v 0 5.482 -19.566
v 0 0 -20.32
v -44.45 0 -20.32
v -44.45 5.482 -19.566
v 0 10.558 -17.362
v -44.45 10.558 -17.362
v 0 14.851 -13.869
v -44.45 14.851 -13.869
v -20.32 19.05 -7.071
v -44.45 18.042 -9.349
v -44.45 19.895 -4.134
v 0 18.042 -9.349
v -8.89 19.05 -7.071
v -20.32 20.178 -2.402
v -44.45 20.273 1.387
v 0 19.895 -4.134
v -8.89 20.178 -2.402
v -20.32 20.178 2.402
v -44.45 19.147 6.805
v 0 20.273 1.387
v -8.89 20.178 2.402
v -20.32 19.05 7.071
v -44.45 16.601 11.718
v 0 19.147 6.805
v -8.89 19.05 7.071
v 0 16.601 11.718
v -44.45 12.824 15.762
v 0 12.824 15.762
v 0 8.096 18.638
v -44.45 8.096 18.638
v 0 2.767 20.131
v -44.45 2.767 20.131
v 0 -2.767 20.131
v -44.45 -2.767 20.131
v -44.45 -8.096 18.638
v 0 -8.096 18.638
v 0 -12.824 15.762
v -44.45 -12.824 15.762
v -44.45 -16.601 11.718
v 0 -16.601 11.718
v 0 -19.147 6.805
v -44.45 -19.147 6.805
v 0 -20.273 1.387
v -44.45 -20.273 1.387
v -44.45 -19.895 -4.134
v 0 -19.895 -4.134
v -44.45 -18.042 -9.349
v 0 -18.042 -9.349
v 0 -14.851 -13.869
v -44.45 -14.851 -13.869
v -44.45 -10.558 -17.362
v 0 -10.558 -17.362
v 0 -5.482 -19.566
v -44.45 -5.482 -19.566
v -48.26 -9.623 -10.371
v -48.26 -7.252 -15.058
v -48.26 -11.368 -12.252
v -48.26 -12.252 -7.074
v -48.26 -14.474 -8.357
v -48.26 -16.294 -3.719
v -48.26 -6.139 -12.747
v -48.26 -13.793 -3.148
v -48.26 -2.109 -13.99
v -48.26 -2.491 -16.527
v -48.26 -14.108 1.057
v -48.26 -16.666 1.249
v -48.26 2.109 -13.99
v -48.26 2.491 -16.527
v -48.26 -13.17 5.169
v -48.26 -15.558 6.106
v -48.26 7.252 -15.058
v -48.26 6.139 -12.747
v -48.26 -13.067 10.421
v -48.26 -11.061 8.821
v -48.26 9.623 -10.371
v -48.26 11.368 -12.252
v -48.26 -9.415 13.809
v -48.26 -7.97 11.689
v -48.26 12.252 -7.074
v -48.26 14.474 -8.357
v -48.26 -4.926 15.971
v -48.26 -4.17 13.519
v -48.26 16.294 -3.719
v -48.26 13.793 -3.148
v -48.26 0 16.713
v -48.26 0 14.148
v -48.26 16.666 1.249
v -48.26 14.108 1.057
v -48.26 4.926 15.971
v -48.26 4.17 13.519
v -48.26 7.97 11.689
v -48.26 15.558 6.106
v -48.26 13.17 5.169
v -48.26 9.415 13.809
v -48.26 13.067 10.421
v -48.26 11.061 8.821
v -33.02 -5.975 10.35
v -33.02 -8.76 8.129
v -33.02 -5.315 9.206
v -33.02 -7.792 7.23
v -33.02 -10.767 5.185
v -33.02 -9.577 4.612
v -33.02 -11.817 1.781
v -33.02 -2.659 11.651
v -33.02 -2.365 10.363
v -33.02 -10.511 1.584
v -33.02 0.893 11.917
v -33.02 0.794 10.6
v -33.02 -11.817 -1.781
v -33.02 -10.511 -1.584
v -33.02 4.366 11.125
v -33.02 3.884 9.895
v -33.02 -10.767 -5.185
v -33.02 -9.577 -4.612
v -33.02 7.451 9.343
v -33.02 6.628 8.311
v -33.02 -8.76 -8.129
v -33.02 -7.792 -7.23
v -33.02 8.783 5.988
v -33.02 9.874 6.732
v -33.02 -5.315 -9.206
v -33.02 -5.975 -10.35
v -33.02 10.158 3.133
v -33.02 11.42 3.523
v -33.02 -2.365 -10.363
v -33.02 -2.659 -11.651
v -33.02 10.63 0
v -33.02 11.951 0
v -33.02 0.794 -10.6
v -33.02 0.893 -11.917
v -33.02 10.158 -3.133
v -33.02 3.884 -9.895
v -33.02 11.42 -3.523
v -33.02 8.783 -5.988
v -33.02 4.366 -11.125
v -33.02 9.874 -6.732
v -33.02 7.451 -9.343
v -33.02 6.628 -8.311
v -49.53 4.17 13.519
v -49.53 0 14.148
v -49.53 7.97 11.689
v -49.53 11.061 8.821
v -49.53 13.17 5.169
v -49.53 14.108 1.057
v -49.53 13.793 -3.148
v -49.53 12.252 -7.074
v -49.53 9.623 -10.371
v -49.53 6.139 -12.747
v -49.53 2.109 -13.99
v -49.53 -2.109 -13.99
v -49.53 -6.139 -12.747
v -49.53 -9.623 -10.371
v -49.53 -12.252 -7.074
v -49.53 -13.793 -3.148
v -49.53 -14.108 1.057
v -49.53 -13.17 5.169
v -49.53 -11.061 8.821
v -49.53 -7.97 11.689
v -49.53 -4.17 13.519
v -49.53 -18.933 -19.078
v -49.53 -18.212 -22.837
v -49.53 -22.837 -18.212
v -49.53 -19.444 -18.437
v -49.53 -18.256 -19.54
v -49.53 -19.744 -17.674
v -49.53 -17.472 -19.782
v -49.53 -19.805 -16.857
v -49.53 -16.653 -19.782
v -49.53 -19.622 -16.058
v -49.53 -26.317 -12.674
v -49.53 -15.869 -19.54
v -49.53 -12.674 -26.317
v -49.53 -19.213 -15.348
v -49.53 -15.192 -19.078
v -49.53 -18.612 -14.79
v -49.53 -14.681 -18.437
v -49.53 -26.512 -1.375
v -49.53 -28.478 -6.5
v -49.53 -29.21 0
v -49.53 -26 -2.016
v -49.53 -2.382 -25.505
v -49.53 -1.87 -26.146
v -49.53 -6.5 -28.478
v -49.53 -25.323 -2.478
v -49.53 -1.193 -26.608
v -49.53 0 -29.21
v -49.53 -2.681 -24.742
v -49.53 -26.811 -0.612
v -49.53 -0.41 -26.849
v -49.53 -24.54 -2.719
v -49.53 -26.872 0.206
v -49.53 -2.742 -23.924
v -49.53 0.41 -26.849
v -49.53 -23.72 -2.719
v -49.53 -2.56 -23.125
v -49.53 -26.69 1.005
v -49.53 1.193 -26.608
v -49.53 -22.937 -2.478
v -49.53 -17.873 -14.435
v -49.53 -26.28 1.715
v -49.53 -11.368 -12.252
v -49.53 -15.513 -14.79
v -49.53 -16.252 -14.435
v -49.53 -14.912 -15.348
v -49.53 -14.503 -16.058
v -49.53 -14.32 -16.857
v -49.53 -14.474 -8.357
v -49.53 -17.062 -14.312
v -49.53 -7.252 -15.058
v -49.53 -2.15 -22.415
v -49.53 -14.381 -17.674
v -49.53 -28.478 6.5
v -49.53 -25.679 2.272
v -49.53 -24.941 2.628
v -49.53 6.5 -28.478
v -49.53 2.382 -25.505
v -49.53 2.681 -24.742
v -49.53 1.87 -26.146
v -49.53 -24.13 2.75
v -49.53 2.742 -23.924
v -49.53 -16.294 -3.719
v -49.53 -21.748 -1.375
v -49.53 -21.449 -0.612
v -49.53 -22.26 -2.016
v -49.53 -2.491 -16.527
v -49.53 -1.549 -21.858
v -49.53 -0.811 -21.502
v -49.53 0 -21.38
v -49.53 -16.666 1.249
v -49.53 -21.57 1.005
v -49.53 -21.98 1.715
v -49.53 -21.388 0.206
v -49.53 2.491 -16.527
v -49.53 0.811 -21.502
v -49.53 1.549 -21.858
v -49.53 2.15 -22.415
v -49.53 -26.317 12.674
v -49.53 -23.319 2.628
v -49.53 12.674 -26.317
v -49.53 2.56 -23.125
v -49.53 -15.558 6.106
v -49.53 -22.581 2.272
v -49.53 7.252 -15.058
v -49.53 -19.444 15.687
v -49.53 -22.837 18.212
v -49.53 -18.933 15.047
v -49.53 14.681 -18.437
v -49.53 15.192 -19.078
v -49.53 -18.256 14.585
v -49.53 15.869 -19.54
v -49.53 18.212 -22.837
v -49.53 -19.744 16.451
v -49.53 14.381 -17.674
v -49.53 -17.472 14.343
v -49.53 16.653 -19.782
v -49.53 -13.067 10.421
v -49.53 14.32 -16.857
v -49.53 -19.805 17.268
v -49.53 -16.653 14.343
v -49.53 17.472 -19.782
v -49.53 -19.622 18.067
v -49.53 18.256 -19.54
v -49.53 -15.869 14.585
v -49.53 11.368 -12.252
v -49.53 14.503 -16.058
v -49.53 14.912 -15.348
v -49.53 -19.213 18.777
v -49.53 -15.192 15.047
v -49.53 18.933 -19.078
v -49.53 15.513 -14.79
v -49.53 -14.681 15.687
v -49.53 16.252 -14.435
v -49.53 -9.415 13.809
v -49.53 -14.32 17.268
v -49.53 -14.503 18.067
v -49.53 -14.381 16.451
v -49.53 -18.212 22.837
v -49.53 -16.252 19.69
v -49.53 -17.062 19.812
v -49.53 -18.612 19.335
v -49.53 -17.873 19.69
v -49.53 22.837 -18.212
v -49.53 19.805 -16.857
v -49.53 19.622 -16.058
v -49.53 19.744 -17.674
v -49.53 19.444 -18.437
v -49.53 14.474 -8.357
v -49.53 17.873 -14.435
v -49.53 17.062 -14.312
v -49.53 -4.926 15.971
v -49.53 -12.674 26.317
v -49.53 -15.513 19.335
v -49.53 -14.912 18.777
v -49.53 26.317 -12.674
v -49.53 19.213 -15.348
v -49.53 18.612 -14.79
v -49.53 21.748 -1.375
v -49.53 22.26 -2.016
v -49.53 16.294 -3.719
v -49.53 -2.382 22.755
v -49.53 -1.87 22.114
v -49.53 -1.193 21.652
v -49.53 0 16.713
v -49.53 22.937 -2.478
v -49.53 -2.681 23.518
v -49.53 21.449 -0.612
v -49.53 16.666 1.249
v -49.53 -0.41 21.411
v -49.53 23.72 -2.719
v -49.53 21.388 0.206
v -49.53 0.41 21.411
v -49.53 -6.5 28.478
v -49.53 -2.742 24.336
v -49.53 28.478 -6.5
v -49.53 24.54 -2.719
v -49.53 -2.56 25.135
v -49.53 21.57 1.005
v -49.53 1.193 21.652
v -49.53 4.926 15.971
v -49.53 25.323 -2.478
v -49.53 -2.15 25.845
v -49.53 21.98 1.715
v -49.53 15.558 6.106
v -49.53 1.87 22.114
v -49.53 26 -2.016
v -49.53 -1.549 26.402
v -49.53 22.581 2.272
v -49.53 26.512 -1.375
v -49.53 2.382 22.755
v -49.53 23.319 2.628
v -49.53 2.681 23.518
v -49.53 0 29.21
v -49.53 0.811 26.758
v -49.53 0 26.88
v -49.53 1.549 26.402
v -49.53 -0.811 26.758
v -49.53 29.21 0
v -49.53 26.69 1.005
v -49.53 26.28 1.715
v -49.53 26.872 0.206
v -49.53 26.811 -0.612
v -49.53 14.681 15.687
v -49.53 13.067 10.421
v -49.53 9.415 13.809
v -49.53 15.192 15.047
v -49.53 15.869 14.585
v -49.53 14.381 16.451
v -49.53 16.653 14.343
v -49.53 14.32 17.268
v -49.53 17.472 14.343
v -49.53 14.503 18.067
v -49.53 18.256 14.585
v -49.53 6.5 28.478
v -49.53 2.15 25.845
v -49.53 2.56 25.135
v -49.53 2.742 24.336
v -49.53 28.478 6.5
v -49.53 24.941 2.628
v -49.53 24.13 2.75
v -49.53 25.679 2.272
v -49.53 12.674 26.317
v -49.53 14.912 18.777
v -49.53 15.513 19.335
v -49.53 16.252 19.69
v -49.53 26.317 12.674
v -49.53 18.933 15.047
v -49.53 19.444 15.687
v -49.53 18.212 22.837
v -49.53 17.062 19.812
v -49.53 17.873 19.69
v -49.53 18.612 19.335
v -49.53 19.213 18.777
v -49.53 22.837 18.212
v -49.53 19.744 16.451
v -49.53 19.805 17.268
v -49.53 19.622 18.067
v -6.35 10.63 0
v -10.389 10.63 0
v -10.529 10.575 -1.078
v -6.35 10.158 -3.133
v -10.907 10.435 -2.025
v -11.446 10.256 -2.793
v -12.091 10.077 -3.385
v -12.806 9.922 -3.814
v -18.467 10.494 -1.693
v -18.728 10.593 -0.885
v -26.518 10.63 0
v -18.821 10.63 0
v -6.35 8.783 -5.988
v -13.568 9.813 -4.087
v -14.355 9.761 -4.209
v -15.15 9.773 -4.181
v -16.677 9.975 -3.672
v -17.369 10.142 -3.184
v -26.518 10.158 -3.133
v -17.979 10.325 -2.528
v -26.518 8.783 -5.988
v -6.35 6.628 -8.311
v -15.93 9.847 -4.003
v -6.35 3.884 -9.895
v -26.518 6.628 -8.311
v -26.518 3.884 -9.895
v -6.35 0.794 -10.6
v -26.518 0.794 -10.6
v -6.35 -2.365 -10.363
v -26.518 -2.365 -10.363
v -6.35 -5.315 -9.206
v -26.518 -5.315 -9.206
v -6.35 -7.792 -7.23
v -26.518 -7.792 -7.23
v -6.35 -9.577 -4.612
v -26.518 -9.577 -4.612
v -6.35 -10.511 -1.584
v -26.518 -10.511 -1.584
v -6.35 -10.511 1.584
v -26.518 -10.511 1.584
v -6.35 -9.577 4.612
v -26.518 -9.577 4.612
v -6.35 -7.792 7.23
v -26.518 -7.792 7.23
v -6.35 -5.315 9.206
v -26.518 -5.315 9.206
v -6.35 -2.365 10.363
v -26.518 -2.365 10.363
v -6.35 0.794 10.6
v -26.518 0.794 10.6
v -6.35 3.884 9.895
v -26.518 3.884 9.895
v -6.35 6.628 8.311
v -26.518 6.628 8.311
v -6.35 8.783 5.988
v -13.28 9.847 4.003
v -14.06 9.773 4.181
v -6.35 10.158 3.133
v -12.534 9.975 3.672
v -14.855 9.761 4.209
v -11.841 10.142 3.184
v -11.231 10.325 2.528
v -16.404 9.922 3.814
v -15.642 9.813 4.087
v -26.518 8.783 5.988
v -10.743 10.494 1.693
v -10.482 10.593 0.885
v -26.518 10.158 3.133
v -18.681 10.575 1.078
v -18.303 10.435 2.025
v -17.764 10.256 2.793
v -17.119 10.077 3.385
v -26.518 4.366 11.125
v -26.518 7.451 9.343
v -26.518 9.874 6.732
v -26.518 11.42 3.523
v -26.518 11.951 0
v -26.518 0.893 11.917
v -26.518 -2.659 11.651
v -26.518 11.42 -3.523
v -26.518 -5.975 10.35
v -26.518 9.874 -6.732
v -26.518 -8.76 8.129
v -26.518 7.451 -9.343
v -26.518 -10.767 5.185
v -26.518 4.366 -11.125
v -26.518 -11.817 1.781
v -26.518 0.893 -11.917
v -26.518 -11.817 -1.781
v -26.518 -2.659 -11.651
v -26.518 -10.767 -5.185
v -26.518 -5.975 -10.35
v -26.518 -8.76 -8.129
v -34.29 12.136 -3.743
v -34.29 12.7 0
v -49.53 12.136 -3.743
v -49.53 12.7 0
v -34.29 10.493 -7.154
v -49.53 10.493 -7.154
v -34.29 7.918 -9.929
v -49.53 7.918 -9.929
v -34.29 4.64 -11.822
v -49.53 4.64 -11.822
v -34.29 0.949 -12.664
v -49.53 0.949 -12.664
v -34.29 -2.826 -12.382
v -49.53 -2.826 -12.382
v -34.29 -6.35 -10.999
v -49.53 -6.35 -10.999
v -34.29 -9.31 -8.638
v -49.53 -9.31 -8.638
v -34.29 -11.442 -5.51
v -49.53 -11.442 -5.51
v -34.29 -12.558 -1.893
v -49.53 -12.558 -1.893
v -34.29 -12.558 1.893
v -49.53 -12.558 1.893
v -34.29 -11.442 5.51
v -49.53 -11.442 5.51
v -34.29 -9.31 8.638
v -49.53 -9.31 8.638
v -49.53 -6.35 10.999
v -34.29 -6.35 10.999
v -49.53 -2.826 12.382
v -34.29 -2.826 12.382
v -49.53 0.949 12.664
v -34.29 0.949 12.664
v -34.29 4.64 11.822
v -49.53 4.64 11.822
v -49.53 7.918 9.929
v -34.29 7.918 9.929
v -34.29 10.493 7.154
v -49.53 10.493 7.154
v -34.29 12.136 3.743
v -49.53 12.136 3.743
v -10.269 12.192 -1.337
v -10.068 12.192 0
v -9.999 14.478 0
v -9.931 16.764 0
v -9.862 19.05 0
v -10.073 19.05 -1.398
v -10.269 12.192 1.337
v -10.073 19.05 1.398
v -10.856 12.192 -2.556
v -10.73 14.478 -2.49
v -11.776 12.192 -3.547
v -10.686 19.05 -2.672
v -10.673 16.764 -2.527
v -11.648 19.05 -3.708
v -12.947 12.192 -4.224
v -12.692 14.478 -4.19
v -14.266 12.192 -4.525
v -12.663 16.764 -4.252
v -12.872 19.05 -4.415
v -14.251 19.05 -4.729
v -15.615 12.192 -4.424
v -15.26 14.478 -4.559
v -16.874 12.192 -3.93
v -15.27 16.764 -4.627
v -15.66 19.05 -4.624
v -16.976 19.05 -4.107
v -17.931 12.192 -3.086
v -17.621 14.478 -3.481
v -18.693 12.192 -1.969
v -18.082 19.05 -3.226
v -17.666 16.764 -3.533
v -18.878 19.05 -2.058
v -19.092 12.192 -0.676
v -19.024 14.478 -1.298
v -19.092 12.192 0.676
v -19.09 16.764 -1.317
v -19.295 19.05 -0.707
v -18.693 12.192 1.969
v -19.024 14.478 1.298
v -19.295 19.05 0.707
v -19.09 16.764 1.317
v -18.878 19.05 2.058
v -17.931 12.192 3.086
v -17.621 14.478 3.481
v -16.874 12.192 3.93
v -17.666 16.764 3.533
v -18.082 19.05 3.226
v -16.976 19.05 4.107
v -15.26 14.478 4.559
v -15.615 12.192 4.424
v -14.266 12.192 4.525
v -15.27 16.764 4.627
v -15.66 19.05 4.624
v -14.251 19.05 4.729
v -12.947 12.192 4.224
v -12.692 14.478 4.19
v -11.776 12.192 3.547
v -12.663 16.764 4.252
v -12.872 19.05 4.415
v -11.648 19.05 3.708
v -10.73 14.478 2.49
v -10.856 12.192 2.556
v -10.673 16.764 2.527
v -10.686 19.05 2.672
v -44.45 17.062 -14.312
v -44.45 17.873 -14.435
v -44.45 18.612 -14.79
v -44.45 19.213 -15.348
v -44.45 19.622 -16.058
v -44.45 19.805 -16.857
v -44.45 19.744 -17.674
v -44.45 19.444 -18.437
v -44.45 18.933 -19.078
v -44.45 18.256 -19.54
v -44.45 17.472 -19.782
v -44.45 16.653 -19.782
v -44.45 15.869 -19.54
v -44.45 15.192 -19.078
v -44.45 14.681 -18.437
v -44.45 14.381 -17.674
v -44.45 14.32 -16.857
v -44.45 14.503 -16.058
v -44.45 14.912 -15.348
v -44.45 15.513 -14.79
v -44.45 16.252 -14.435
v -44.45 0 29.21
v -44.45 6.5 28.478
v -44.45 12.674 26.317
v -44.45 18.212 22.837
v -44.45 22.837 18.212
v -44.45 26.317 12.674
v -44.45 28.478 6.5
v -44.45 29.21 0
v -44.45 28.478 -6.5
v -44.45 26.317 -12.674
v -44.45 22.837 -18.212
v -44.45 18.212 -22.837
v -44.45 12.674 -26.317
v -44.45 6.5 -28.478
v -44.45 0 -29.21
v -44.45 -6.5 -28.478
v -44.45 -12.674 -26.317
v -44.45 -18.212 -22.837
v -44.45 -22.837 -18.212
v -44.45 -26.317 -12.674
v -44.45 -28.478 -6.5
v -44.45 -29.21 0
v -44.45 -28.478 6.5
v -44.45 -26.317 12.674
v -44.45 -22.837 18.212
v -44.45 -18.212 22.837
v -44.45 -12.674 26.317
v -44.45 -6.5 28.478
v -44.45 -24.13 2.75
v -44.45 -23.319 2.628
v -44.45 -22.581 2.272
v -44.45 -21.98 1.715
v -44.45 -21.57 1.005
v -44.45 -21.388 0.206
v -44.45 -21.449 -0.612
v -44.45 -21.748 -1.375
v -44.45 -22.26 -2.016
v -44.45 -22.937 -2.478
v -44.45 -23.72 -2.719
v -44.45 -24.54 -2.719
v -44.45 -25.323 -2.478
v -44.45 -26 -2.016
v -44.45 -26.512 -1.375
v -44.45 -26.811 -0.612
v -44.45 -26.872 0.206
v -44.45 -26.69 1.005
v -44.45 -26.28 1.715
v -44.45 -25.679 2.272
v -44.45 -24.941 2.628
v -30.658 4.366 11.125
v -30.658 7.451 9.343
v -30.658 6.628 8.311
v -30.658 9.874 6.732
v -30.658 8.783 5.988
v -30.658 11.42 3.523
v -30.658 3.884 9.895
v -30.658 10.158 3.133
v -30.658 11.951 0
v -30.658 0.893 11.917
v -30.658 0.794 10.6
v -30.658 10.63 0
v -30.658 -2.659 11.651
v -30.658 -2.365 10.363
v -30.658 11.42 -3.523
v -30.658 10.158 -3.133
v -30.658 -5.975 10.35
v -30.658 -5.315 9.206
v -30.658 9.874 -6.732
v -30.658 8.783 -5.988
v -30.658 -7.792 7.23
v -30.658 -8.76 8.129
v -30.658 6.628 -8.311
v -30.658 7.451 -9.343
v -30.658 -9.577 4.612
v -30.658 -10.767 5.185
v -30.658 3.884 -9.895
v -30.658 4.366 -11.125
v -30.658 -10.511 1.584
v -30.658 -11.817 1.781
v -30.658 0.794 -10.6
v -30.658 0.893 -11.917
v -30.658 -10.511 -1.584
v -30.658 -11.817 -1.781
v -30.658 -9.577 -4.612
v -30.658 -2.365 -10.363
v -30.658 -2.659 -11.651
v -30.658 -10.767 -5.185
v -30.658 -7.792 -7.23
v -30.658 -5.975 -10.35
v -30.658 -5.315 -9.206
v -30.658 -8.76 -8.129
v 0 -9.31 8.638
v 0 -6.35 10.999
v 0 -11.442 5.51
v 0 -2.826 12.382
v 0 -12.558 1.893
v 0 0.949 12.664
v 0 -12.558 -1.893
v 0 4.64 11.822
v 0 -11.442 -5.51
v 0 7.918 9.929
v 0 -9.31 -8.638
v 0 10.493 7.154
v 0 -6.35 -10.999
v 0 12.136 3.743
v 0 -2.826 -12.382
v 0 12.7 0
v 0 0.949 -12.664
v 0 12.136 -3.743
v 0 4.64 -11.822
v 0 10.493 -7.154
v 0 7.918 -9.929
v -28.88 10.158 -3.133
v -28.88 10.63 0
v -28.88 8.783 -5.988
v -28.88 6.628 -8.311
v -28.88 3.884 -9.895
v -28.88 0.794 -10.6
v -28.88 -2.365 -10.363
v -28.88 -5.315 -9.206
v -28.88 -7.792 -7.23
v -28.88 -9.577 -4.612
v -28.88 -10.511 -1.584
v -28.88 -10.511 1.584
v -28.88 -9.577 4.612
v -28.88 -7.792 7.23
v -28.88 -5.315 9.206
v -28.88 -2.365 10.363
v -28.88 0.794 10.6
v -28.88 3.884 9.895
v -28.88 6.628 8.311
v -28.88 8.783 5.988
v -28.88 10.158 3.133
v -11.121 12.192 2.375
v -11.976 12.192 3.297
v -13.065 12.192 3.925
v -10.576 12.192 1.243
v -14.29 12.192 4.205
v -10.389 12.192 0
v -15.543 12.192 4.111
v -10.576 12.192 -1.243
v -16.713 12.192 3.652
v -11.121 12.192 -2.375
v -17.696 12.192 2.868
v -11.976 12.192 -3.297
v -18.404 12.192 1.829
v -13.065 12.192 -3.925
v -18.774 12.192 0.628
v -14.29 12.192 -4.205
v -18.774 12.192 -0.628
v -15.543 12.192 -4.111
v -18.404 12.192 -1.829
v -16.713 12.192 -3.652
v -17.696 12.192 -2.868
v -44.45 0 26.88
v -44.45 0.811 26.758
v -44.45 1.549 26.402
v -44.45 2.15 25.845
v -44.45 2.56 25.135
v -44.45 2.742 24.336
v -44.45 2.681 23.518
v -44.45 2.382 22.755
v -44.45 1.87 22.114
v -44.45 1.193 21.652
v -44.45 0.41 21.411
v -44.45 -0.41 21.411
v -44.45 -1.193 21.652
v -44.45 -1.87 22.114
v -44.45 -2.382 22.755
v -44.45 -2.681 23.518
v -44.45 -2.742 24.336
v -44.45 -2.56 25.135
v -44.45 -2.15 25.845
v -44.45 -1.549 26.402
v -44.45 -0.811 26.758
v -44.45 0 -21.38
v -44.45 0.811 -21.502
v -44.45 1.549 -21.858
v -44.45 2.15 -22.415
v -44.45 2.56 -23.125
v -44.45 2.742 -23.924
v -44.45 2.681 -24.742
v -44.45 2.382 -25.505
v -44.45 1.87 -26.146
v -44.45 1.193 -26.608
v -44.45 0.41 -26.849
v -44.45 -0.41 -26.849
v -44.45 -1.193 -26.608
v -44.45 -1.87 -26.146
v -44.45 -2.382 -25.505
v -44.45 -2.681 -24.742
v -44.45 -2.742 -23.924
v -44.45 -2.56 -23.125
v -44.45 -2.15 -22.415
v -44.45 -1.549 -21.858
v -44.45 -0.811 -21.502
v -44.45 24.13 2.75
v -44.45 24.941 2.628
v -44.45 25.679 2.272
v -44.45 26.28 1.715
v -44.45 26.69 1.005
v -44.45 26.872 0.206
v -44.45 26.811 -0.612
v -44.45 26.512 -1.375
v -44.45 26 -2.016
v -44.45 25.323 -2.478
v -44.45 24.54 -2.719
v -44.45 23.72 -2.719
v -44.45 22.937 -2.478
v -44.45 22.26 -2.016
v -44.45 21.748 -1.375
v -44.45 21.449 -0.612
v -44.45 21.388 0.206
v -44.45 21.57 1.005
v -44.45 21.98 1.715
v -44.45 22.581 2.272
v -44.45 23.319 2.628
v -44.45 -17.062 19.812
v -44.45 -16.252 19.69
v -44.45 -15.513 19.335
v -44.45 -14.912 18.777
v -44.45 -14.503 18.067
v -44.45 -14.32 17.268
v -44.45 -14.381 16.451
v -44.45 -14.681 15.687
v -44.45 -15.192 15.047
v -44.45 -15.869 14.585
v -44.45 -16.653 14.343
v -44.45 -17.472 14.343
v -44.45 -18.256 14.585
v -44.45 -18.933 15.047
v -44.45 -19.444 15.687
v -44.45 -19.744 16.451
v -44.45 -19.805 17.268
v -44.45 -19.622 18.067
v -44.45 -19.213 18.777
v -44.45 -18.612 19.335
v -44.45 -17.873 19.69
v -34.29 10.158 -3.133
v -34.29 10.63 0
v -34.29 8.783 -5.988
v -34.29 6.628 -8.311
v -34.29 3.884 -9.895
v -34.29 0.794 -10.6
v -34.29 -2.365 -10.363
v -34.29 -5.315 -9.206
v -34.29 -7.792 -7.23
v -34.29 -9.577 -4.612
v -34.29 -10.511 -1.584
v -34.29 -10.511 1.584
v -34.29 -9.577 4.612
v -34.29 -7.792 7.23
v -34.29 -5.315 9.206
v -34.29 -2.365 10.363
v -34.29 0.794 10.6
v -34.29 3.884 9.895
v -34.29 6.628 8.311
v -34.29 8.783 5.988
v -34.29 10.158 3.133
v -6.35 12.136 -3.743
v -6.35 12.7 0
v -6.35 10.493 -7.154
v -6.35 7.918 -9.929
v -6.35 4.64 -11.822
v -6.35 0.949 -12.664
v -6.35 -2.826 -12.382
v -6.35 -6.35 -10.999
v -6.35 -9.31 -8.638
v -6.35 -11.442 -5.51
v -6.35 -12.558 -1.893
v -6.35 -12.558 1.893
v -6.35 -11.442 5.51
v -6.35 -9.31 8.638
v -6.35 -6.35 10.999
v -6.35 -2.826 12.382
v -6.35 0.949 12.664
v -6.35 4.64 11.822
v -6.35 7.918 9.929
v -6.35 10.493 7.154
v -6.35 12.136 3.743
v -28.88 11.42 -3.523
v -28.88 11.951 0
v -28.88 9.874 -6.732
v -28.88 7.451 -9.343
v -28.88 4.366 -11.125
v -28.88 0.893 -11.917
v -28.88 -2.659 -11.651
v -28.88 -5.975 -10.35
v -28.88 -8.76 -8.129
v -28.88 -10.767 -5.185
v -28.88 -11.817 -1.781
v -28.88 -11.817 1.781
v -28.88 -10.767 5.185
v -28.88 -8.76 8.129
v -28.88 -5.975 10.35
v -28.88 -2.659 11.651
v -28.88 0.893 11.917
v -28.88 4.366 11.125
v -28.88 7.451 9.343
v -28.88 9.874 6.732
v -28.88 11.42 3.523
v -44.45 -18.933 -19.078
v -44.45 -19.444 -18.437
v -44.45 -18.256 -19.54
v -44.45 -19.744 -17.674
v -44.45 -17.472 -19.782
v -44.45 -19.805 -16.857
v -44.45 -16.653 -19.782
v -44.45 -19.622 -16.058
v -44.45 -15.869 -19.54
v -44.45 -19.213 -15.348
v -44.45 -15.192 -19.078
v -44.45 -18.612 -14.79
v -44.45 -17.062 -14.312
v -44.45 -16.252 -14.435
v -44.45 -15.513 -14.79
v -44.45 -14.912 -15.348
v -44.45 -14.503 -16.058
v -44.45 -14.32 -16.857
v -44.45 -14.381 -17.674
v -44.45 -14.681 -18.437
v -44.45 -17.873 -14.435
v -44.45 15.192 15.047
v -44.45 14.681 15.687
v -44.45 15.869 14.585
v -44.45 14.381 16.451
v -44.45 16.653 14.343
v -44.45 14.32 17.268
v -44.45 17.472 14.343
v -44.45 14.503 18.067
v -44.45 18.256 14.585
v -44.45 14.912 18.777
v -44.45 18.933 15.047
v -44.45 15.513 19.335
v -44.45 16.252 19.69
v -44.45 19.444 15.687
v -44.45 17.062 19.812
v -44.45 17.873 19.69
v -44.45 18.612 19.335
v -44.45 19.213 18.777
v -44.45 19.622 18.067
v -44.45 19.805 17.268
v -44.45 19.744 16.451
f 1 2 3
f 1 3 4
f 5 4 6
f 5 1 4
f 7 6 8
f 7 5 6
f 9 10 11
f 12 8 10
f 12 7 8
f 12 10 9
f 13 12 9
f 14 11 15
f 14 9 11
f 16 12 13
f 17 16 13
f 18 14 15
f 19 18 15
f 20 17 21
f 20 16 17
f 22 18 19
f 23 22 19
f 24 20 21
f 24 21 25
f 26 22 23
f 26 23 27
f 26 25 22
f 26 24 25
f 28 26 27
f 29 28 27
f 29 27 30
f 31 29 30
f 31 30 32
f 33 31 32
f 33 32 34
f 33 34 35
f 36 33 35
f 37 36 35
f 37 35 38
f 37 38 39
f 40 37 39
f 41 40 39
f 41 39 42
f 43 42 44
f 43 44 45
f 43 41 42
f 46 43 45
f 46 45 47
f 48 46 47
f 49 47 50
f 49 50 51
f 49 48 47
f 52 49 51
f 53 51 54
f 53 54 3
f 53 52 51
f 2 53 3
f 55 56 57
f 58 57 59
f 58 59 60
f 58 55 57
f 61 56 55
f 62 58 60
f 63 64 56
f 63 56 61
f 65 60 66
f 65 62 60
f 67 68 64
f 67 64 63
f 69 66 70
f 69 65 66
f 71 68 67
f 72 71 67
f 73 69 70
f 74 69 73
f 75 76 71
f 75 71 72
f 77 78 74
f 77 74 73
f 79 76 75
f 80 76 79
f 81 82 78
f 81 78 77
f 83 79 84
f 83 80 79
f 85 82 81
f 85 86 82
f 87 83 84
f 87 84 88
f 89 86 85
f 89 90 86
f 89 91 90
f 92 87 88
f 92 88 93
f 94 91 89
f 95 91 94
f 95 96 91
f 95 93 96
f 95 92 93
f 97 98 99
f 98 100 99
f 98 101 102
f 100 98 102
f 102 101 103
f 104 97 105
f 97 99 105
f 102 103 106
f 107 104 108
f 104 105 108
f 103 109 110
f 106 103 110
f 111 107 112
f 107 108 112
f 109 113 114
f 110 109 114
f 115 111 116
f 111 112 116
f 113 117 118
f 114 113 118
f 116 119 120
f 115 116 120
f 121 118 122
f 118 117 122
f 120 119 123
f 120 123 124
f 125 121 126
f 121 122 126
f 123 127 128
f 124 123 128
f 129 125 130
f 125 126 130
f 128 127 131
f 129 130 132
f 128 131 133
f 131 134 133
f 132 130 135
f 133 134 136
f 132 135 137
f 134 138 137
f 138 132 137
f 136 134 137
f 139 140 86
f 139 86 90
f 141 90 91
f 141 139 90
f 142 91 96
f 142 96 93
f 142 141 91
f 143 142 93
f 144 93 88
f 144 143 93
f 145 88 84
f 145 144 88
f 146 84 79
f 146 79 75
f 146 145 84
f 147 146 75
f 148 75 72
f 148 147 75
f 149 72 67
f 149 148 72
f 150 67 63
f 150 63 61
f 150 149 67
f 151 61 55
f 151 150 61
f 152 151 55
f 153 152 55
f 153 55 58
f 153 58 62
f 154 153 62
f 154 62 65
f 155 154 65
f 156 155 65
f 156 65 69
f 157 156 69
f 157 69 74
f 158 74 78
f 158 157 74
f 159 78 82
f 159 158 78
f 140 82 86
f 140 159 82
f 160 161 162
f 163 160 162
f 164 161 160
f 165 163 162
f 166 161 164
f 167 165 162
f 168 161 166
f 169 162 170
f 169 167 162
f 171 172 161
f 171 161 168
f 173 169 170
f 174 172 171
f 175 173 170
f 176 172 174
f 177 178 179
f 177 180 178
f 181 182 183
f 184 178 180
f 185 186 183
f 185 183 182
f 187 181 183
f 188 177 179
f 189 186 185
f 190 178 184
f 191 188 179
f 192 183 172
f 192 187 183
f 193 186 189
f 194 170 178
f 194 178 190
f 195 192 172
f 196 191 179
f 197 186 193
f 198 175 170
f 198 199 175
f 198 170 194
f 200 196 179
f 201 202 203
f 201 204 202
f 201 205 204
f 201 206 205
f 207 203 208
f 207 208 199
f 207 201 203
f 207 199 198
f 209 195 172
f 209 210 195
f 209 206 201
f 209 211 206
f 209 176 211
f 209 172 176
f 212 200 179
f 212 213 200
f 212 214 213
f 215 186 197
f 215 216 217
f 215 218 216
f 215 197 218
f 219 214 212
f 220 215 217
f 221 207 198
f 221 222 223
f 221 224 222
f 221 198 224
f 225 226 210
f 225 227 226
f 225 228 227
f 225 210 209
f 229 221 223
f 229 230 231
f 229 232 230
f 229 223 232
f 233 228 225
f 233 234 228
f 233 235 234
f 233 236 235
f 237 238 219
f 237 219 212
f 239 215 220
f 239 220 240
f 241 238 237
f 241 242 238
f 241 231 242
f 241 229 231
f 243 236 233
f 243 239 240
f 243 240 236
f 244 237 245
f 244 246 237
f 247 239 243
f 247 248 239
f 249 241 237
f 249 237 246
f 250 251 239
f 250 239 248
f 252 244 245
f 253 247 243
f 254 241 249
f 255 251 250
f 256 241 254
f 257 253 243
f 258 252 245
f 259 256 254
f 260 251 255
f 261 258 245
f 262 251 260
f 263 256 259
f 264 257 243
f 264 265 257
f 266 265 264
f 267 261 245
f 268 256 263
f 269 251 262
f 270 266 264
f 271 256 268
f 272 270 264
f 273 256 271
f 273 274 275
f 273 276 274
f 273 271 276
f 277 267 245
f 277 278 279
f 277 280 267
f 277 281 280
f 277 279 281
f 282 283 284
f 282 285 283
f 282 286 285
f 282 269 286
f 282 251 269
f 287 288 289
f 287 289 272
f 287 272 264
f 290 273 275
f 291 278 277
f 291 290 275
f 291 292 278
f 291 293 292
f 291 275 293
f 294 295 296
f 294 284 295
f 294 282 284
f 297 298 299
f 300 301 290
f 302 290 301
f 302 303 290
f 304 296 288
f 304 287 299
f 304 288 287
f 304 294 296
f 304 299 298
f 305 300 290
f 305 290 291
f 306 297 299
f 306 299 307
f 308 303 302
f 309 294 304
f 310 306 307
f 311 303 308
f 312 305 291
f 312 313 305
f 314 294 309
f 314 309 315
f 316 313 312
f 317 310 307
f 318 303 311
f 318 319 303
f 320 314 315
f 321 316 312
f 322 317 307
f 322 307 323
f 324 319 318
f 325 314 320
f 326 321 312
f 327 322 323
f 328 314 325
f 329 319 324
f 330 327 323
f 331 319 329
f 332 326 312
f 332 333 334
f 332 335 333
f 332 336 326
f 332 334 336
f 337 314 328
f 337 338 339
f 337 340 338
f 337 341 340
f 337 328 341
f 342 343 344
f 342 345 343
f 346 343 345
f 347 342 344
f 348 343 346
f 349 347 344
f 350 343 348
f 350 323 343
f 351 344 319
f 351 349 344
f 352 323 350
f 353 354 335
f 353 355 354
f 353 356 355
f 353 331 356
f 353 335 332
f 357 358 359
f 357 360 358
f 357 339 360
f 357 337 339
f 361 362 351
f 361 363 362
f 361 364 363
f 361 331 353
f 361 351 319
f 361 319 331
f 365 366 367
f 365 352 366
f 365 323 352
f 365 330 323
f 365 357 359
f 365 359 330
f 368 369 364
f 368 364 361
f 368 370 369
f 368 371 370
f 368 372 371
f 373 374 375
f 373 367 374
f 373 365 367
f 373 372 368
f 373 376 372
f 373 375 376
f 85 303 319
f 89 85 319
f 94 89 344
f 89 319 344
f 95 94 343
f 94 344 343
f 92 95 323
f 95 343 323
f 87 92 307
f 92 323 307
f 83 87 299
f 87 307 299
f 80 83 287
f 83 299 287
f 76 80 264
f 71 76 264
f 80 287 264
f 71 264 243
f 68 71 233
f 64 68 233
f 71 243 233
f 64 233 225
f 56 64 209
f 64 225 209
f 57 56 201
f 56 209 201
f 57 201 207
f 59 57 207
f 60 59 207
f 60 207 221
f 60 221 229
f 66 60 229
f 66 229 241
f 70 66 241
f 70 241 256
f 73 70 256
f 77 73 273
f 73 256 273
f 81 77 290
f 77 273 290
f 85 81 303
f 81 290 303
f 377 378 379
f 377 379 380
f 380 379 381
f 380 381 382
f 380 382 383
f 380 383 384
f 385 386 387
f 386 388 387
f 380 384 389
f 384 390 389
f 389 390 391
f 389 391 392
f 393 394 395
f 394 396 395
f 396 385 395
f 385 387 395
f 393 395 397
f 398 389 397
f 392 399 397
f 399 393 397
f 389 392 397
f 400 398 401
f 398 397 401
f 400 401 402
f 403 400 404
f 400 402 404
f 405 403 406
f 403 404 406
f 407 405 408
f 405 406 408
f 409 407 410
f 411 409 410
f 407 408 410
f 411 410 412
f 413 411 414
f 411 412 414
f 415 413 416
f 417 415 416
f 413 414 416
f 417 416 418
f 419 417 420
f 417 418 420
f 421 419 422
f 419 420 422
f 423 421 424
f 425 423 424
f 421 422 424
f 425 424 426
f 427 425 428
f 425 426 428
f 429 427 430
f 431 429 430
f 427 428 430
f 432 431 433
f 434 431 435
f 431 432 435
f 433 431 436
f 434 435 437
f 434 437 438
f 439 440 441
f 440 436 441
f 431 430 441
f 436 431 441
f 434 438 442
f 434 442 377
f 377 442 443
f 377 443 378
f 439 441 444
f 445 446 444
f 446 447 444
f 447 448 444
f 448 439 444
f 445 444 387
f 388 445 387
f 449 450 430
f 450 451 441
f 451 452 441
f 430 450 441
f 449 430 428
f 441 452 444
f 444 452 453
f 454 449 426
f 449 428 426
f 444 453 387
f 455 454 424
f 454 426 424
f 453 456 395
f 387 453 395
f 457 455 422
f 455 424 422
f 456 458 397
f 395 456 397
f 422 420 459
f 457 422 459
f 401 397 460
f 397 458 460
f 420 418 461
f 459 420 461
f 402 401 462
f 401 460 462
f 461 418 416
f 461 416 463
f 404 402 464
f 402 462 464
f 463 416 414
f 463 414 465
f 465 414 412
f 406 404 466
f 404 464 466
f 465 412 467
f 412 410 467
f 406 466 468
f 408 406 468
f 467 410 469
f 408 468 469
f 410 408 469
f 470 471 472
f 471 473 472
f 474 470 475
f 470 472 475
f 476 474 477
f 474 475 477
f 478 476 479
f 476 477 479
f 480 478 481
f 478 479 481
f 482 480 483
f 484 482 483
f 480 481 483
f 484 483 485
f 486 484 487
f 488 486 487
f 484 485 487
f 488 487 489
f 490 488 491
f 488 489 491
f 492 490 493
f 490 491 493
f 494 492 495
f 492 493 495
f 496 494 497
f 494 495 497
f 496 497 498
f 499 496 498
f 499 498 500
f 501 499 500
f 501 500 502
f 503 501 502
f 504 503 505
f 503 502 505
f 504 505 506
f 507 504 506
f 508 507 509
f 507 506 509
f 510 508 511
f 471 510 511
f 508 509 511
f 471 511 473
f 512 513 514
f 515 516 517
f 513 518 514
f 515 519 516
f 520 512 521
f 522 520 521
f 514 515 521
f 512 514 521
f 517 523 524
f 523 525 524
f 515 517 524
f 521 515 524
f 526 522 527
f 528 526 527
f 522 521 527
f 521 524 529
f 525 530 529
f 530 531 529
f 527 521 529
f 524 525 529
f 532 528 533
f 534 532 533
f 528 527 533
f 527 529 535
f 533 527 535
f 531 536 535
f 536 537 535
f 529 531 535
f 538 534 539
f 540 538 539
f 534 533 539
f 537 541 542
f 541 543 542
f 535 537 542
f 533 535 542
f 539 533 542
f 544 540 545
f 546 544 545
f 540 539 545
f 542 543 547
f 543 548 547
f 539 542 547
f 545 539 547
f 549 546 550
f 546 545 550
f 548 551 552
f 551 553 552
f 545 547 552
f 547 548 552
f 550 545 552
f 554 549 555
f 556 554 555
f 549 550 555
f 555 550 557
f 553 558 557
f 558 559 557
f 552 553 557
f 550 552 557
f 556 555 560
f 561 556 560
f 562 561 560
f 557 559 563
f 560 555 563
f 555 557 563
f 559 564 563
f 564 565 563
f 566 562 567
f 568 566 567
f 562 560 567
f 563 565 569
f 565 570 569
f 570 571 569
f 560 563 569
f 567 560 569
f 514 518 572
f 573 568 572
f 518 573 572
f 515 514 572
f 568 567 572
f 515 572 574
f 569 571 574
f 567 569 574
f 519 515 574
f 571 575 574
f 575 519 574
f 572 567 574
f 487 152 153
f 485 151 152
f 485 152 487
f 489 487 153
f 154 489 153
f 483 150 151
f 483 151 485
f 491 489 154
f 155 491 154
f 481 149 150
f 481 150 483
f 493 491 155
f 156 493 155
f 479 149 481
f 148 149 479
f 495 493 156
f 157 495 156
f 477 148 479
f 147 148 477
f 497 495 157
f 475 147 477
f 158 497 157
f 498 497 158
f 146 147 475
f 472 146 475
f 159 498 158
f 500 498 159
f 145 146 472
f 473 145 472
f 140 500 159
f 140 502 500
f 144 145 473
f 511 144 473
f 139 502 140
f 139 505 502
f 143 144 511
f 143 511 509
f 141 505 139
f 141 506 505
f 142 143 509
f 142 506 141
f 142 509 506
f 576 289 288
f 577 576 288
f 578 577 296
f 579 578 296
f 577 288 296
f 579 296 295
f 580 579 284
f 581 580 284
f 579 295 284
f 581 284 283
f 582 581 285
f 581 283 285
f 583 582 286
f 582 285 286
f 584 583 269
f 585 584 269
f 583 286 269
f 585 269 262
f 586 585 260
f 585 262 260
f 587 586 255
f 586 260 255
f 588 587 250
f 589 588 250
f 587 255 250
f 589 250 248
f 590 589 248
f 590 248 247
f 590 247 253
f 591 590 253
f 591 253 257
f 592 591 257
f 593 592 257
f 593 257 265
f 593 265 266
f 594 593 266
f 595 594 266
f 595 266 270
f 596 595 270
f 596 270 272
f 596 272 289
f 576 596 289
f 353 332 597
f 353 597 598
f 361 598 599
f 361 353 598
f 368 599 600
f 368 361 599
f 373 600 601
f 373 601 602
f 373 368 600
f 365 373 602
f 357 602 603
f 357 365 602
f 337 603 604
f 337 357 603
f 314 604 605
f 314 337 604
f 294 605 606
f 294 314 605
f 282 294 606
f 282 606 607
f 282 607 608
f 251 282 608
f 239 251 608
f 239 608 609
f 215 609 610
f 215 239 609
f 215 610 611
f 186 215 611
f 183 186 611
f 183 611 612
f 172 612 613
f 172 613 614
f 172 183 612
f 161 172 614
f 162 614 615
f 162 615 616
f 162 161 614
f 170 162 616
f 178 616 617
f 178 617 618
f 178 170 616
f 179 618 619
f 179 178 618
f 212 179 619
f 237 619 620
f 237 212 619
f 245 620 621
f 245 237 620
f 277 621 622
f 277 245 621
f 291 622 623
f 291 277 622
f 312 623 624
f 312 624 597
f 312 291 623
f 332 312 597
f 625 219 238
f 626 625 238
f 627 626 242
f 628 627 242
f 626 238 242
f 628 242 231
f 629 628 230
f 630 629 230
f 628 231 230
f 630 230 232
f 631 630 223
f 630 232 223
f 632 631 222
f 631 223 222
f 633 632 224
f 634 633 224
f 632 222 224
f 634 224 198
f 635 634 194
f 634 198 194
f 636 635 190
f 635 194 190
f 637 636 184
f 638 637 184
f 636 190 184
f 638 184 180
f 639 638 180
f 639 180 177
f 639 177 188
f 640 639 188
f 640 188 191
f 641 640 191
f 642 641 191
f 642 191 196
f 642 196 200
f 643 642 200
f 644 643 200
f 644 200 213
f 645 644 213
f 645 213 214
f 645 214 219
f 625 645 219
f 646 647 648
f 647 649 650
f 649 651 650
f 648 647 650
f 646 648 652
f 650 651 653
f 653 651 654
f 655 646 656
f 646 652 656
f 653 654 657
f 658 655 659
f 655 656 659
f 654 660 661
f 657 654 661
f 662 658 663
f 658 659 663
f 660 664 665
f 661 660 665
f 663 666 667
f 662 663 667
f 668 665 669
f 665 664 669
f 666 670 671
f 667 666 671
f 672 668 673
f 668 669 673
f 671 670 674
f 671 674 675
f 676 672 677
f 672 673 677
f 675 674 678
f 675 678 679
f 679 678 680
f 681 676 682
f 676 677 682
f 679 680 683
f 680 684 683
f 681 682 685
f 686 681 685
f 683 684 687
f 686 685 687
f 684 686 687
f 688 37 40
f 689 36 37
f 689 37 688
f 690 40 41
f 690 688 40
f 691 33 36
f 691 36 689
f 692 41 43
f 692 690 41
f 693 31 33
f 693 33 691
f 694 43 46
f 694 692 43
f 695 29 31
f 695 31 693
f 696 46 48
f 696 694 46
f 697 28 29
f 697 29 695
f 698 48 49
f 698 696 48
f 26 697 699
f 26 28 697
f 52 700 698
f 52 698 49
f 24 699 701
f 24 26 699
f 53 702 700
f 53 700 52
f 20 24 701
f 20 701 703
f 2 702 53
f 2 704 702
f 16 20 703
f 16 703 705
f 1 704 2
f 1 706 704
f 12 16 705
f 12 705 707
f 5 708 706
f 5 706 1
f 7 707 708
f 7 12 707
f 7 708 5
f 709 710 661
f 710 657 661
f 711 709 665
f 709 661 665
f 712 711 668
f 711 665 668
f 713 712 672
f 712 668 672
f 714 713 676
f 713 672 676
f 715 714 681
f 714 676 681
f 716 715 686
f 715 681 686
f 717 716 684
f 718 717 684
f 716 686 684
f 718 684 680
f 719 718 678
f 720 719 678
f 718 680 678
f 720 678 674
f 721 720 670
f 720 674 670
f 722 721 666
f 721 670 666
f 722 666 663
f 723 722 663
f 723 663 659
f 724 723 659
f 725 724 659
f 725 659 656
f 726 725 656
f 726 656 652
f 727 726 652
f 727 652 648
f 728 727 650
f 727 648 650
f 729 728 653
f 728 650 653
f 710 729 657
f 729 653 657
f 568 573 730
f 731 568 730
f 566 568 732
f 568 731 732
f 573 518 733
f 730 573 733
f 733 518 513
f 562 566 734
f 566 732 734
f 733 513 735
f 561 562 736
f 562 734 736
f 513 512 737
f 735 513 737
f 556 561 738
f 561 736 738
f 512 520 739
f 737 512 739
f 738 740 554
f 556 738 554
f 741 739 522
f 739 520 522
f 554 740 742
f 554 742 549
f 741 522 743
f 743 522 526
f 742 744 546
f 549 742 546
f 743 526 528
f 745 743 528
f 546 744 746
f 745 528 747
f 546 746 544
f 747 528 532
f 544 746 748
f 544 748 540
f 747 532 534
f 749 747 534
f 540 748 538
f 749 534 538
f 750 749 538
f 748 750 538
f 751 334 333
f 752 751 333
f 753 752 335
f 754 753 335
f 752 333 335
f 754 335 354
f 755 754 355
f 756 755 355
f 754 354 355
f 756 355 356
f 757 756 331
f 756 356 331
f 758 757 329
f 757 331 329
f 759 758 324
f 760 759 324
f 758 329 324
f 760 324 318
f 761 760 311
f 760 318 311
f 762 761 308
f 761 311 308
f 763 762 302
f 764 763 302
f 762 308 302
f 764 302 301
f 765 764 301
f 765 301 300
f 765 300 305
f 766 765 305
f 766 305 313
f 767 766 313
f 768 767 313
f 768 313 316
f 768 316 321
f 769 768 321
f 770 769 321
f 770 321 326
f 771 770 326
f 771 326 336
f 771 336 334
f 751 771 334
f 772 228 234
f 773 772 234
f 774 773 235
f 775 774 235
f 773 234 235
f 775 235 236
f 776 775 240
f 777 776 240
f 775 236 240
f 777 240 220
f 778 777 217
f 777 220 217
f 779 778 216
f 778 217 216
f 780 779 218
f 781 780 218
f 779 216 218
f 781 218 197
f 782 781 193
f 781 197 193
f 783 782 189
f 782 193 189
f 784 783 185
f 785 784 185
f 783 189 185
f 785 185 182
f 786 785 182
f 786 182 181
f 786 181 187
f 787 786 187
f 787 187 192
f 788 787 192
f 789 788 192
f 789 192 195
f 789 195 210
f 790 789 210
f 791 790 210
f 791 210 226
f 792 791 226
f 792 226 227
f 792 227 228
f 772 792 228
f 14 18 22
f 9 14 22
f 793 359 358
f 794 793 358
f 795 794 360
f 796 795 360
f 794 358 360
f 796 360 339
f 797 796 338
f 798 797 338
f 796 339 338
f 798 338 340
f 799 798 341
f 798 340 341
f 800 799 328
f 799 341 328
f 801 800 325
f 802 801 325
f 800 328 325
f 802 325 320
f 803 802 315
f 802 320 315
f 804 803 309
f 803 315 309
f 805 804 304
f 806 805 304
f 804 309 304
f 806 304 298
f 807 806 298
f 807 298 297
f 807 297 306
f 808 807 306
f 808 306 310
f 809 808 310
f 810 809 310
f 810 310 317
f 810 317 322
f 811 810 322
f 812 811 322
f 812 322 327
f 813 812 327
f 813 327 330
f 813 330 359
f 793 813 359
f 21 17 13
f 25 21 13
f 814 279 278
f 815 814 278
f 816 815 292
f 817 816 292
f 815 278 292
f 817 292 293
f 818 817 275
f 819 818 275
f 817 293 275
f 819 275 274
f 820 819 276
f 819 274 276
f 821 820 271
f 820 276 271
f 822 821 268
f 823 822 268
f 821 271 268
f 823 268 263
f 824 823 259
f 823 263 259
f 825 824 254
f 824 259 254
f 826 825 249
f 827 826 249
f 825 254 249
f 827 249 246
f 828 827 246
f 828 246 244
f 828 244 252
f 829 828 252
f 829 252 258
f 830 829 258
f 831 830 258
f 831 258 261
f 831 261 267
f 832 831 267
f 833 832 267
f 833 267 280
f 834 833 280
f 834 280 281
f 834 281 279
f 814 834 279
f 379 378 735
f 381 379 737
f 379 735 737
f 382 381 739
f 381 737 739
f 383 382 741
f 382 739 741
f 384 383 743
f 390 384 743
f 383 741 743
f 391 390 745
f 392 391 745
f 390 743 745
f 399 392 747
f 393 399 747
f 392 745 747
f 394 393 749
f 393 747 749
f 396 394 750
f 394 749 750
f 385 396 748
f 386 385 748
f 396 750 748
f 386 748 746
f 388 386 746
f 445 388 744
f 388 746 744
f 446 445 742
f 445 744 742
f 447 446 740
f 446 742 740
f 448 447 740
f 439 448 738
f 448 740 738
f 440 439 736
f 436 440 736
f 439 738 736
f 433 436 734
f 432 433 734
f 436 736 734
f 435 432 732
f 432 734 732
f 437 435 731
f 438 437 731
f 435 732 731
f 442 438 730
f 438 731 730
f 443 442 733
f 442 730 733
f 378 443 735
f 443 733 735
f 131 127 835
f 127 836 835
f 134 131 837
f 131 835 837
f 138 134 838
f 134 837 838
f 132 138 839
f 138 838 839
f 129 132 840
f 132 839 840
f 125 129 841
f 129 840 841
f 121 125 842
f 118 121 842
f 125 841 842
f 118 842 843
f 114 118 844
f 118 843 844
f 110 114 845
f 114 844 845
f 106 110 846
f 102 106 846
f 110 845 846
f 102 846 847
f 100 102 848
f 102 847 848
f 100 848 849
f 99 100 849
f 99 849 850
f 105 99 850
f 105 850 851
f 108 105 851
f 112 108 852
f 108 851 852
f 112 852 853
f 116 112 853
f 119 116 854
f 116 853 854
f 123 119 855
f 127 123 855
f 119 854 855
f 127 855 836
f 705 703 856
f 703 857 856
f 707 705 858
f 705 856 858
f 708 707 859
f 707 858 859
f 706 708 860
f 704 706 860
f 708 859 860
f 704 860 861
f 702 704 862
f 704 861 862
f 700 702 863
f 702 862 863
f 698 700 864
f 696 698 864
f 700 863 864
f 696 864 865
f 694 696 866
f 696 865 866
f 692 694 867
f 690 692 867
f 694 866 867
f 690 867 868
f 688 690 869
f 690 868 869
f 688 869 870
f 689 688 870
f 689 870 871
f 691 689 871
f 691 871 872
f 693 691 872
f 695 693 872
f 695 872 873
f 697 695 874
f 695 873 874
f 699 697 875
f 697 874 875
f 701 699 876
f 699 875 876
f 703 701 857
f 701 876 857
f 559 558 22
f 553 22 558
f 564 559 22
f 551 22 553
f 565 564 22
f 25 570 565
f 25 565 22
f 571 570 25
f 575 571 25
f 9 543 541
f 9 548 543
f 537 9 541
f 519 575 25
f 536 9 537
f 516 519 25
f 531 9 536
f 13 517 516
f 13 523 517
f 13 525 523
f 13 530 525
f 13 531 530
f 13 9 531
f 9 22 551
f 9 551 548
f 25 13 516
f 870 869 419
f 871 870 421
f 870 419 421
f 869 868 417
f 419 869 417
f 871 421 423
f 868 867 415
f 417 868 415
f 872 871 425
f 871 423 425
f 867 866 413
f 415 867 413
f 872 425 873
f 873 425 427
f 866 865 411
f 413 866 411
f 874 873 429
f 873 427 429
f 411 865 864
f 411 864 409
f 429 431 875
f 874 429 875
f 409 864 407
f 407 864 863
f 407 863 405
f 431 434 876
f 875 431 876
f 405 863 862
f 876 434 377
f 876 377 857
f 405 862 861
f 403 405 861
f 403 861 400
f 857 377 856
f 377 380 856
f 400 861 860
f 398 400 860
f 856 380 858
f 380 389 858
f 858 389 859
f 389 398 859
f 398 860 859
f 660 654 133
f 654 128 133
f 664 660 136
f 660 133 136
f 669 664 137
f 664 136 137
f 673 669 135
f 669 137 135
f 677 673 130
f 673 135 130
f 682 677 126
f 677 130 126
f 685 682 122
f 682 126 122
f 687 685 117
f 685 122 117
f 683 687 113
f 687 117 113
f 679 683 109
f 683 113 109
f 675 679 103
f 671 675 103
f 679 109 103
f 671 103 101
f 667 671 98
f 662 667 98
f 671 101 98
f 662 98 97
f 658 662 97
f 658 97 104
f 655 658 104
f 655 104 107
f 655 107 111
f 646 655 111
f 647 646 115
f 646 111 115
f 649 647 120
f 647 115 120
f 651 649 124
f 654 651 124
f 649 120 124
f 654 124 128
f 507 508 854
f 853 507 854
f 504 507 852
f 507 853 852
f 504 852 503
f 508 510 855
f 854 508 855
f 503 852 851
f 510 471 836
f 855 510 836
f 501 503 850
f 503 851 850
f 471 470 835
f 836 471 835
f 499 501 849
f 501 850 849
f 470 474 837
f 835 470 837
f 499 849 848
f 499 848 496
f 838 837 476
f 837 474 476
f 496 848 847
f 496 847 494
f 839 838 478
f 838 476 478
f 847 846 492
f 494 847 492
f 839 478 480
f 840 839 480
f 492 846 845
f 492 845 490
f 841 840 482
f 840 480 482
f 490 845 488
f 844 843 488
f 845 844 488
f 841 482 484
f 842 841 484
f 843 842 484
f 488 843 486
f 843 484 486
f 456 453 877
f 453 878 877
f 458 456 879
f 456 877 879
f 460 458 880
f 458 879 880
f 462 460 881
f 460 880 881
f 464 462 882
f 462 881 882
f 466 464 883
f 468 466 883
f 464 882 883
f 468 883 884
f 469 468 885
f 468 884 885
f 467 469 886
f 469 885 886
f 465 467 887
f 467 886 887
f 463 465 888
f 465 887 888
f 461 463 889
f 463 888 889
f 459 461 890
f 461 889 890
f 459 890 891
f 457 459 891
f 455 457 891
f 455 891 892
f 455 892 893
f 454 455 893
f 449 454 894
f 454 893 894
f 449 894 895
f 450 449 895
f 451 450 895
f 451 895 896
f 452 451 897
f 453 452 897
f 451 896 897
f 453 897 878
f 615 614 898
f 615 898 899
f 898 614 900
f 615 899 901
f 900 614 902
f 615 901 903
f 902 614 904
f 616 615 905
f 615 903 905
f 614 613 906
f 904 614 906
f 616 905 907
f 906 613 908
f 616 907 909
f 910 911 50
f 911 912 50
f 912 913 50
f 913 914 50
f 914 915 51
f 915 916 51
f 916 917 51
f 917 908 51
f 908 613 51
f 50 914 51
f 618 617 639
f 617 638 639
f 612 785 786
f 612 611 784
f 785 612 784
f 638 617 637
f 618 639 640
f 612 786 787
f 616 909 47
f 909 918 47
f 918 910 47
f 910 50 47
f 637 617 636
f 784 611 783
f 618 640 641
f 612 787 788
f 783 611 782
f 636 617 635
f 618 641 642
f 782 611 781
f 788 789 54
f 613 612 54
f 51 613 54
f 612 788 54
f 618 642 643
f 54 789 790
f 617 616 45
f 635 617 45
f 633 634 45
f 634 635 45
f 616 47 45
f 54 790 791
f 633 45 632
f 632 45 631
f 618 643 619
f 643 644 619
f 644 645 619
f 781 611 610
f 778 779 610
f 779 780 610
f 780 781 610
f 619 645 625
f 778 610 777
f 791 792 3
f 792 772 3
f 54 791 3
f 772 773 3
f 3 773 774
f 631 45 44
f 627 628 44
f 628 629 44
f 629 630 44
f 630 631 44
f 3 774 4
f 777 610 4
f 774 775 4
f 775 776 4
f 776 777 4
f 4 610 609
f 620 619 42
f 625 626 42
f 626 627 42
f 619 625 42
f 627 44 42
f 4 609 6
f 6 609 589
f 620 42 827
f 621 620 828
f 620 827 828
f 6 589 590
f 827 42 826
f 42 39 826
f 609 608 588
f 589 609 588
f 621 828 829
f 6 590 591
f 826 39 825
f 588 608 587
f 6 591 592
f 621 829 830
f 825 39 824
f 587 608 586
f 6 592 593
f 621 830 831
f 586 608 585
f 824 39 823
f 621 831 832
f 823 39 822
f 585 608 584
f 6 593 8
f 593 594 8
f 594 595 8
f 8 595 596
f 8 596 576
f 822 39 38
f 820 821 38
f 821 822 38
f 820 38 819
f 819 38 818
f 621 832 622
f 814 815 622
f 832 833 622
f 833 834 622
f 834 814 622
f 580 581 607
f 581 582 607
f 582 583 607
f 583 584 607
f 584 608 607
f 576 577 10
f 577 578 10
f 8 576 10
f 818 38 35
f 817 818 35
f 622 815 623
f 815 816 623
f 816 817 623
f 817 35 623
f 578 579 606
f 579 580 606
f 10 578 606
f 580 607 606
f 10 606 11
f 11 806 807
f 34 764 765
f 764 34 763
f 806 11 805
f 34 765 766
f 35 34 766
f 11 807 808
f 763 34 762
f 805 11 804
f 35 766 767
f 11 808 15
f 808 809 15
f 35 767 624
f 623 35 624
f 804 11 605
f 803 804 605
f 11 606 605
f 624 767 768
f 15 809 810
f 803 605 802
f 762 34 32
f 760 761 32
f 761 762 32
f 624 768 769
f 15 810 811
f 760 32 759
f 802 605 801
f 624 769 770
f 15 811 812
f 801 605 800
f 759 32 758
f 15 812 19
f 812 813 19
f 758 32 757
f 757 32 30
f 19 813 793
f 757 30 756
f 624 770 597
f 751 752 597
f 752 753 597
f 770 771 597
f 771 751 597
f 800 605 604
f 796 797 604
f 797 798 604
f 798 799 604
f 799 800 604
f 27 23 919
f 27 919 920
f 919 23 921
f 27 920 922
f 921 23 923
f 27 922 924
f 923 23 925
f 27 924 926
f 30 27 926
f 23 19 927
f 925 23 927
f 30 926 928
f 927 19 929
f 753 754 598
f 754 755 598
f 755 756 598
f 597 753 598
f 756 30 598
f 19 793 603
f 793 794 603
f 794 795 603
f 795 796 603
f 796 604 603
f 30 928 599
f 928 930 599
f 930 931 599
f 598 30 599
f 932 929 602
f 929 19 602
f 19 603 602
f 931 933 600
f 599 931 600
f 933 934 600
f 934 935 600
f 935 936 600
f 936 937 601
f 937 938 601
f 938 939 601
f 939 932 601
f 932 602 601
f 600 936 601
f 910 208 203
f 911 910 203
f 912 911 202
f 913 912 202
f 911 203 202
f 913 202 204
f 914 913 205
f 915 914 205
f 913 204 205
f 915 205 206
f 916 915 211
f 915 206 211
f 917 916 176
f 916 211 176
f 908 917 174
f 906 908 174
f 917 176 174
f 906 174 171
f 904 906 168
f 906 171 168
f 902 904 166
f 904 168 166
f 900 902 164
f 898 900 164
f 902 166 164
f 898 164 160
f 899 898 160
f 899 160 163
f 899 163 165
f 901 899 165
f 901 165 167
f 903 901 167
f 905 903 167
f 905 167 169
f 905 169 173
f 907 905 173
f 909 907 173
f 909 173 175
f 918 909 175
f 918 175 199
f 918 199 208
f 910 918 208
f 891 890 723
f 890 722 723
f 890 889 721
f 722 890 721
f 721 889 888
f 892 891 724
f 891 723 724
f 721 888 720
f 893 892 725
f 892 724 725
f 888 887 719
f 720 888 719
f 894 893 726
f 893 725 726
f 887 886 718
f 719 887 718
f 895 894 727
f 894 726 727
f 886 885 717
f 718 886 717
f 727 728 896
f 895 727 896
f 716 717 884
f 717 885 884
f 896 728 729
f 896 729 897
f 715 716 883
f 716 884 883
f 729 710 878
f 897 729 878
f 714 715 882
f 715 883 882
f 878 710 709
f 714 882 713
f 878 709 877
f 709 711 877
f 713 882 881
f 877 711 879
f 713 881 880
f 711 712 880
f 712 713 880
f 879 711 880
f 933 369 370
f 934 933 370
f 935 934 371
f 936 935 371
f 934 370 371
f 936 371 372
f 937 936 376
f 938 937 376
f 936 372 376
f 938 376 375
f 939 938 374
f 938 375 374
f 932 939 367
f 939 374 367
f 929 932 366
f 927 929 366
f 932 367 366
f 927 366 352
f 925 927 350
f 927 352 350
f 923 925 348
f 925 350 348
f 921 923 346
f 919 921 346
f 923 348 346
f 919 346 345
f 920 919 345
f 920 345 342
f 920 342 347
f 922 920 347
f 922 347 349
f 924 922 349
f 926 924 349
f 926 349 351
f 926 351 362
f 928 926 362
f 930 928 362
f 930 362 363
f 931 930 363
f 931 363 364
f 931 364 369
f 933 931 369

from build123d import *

# Parameters (mm, degrees)
SKETCH2_R                = 20.32
BOSS_EXTRUDE1_DEPTH      = 49.53
SKETCH3_R                = 29.21
SKETCH3_R_2              = 19.05
BOSS_EXTRUDE2_DEPTH      = 5.08
M5_CLEARANCE_HOLE1_D     = 5.5
M5_CLEARANCE_HOLE1_DEPTH = 5.08
SKETCH6_W                = 11.43
SKETCH6_H                = 25.4
CUT_EXTRUDE1_DEPTH       = 1.27
SKETCH9_R                = 16.7132
SKETCH9_R_2              = 14.1478
CUT_EXTRUDE2_DEPTH       = 1.27


# Read off the part's stored shape, not the designer's step: 1/8 NPT Tapped Hole1
with BuildPart() as part:
    # Sketch2 → Boss-Extrude1 (new body)
    with BuildSketch(Plane(origin=(0, 0, 0), x_dir=(0, 0, -1), z_dir=(1, 0, 0))):
        Circle(SKETCH2_R)
    extrude(amount=-BOSS_EXTRUDE1_DEPTH)

    # Sketch1 → Cut-Revolve1 (revolve, cut)
    with BuildSketch(Plane.XY):
        Polygon((-30.6578, 10.6299), (-30.6578, 11.9507), (-33.02, 11.9507), (-33.02, 10.6299), (-34.29, 10.6299), (-34.29, 12.7), (-49.53, 12.7), (-49.53, 0), (0, 0), (0, 12.7), (-6.35, 12.7), (-6.35, 10.6299), (-26.5176, 10.6299), (-26.5176, 11.9507), (-28.8798, 11.9507), (-28.8798, 10.6299), align=None)
    revolve(axis=Axis((0, 0, 0), (-1, 0, 0)), mode=Mode.SUBTRACT)

    # Sketch3 → Boss-Extrude2 (add)
    with BuildSketch(Plane.ZY.offset(49.53)):
        Circle(SKETCH3_R)
        Circle(SKETCH3_R_2, mode=Mode.SUBTRACT)
    extrude(amount=-BOSS_EXTRUDE2_DEPTH)

    # M5 Clearance Hole1
    with Locations(Plane(origin=(-44.45, 0, 0), x_dir=(0, 0, -1), z_dir=(1, 0, 0))):
        with Locations((0, 24.13), (0, 0), (17.06248663, 17.06248663), (24.13, 0), (17.06248663, -17.06248663), (0, -24.13), (-17.06248663, -17.06248663), (-24.13, 0), (-17.06248663, 17.06248663)):
            Hole(M5_CLEARANCE_HOLE1_D / 2, depth=M5_CLEARANCE_HOLE1_DEPTH)

    # Sketch6 → Cut-Extrude1 (cut)
    with BuildSketch(Plane(origin=(0, 20.32, 0), x_dir=(1, 0, 0), z_dir=(0, 1, 0))):
        with Locations((-14.605, 0)):
            Rectangle(SKETCH6_W, SKETCH6_H)
    extrude(amount=-CUT_EXTRUDE1_DEPTH, mode=Mode.SUBTRACT)

    # 1/8 NPT Tapped Hole1 outline → 1/8 NPT Tapped Hole1 (revolve, cut)
    with BuildSketch(Plane(origin=(-14.605, 0, 0), x_dir=(1, 0, 0), z_dir=(0, 0, 1))):
        Polygon((0, 9.757655132), (4.2164, 9.757655132), (4.2164, 12.192), (4.537401096, 12.192), (4.7427388, 19.05), (0, 19.05), align=None)
    revolve(axis=Axis((-14.605, 0, 0), (0, 1, 0)), mode=Mode.SUBTRACT)

    # Sketch9 → Cut-Extrude2 (cut)
    with BuildSketch(Plane.ZY.offset(49.53)):
        Circle(SKETCH9_R)
        Circle(SKETCH9_R_2, mode=Mode.SUBTRACT)
    extrude(amount=-CUT_EXTRUDE2_DEPTH, mode=Mode.SUBTRACT)


solid = part.part
